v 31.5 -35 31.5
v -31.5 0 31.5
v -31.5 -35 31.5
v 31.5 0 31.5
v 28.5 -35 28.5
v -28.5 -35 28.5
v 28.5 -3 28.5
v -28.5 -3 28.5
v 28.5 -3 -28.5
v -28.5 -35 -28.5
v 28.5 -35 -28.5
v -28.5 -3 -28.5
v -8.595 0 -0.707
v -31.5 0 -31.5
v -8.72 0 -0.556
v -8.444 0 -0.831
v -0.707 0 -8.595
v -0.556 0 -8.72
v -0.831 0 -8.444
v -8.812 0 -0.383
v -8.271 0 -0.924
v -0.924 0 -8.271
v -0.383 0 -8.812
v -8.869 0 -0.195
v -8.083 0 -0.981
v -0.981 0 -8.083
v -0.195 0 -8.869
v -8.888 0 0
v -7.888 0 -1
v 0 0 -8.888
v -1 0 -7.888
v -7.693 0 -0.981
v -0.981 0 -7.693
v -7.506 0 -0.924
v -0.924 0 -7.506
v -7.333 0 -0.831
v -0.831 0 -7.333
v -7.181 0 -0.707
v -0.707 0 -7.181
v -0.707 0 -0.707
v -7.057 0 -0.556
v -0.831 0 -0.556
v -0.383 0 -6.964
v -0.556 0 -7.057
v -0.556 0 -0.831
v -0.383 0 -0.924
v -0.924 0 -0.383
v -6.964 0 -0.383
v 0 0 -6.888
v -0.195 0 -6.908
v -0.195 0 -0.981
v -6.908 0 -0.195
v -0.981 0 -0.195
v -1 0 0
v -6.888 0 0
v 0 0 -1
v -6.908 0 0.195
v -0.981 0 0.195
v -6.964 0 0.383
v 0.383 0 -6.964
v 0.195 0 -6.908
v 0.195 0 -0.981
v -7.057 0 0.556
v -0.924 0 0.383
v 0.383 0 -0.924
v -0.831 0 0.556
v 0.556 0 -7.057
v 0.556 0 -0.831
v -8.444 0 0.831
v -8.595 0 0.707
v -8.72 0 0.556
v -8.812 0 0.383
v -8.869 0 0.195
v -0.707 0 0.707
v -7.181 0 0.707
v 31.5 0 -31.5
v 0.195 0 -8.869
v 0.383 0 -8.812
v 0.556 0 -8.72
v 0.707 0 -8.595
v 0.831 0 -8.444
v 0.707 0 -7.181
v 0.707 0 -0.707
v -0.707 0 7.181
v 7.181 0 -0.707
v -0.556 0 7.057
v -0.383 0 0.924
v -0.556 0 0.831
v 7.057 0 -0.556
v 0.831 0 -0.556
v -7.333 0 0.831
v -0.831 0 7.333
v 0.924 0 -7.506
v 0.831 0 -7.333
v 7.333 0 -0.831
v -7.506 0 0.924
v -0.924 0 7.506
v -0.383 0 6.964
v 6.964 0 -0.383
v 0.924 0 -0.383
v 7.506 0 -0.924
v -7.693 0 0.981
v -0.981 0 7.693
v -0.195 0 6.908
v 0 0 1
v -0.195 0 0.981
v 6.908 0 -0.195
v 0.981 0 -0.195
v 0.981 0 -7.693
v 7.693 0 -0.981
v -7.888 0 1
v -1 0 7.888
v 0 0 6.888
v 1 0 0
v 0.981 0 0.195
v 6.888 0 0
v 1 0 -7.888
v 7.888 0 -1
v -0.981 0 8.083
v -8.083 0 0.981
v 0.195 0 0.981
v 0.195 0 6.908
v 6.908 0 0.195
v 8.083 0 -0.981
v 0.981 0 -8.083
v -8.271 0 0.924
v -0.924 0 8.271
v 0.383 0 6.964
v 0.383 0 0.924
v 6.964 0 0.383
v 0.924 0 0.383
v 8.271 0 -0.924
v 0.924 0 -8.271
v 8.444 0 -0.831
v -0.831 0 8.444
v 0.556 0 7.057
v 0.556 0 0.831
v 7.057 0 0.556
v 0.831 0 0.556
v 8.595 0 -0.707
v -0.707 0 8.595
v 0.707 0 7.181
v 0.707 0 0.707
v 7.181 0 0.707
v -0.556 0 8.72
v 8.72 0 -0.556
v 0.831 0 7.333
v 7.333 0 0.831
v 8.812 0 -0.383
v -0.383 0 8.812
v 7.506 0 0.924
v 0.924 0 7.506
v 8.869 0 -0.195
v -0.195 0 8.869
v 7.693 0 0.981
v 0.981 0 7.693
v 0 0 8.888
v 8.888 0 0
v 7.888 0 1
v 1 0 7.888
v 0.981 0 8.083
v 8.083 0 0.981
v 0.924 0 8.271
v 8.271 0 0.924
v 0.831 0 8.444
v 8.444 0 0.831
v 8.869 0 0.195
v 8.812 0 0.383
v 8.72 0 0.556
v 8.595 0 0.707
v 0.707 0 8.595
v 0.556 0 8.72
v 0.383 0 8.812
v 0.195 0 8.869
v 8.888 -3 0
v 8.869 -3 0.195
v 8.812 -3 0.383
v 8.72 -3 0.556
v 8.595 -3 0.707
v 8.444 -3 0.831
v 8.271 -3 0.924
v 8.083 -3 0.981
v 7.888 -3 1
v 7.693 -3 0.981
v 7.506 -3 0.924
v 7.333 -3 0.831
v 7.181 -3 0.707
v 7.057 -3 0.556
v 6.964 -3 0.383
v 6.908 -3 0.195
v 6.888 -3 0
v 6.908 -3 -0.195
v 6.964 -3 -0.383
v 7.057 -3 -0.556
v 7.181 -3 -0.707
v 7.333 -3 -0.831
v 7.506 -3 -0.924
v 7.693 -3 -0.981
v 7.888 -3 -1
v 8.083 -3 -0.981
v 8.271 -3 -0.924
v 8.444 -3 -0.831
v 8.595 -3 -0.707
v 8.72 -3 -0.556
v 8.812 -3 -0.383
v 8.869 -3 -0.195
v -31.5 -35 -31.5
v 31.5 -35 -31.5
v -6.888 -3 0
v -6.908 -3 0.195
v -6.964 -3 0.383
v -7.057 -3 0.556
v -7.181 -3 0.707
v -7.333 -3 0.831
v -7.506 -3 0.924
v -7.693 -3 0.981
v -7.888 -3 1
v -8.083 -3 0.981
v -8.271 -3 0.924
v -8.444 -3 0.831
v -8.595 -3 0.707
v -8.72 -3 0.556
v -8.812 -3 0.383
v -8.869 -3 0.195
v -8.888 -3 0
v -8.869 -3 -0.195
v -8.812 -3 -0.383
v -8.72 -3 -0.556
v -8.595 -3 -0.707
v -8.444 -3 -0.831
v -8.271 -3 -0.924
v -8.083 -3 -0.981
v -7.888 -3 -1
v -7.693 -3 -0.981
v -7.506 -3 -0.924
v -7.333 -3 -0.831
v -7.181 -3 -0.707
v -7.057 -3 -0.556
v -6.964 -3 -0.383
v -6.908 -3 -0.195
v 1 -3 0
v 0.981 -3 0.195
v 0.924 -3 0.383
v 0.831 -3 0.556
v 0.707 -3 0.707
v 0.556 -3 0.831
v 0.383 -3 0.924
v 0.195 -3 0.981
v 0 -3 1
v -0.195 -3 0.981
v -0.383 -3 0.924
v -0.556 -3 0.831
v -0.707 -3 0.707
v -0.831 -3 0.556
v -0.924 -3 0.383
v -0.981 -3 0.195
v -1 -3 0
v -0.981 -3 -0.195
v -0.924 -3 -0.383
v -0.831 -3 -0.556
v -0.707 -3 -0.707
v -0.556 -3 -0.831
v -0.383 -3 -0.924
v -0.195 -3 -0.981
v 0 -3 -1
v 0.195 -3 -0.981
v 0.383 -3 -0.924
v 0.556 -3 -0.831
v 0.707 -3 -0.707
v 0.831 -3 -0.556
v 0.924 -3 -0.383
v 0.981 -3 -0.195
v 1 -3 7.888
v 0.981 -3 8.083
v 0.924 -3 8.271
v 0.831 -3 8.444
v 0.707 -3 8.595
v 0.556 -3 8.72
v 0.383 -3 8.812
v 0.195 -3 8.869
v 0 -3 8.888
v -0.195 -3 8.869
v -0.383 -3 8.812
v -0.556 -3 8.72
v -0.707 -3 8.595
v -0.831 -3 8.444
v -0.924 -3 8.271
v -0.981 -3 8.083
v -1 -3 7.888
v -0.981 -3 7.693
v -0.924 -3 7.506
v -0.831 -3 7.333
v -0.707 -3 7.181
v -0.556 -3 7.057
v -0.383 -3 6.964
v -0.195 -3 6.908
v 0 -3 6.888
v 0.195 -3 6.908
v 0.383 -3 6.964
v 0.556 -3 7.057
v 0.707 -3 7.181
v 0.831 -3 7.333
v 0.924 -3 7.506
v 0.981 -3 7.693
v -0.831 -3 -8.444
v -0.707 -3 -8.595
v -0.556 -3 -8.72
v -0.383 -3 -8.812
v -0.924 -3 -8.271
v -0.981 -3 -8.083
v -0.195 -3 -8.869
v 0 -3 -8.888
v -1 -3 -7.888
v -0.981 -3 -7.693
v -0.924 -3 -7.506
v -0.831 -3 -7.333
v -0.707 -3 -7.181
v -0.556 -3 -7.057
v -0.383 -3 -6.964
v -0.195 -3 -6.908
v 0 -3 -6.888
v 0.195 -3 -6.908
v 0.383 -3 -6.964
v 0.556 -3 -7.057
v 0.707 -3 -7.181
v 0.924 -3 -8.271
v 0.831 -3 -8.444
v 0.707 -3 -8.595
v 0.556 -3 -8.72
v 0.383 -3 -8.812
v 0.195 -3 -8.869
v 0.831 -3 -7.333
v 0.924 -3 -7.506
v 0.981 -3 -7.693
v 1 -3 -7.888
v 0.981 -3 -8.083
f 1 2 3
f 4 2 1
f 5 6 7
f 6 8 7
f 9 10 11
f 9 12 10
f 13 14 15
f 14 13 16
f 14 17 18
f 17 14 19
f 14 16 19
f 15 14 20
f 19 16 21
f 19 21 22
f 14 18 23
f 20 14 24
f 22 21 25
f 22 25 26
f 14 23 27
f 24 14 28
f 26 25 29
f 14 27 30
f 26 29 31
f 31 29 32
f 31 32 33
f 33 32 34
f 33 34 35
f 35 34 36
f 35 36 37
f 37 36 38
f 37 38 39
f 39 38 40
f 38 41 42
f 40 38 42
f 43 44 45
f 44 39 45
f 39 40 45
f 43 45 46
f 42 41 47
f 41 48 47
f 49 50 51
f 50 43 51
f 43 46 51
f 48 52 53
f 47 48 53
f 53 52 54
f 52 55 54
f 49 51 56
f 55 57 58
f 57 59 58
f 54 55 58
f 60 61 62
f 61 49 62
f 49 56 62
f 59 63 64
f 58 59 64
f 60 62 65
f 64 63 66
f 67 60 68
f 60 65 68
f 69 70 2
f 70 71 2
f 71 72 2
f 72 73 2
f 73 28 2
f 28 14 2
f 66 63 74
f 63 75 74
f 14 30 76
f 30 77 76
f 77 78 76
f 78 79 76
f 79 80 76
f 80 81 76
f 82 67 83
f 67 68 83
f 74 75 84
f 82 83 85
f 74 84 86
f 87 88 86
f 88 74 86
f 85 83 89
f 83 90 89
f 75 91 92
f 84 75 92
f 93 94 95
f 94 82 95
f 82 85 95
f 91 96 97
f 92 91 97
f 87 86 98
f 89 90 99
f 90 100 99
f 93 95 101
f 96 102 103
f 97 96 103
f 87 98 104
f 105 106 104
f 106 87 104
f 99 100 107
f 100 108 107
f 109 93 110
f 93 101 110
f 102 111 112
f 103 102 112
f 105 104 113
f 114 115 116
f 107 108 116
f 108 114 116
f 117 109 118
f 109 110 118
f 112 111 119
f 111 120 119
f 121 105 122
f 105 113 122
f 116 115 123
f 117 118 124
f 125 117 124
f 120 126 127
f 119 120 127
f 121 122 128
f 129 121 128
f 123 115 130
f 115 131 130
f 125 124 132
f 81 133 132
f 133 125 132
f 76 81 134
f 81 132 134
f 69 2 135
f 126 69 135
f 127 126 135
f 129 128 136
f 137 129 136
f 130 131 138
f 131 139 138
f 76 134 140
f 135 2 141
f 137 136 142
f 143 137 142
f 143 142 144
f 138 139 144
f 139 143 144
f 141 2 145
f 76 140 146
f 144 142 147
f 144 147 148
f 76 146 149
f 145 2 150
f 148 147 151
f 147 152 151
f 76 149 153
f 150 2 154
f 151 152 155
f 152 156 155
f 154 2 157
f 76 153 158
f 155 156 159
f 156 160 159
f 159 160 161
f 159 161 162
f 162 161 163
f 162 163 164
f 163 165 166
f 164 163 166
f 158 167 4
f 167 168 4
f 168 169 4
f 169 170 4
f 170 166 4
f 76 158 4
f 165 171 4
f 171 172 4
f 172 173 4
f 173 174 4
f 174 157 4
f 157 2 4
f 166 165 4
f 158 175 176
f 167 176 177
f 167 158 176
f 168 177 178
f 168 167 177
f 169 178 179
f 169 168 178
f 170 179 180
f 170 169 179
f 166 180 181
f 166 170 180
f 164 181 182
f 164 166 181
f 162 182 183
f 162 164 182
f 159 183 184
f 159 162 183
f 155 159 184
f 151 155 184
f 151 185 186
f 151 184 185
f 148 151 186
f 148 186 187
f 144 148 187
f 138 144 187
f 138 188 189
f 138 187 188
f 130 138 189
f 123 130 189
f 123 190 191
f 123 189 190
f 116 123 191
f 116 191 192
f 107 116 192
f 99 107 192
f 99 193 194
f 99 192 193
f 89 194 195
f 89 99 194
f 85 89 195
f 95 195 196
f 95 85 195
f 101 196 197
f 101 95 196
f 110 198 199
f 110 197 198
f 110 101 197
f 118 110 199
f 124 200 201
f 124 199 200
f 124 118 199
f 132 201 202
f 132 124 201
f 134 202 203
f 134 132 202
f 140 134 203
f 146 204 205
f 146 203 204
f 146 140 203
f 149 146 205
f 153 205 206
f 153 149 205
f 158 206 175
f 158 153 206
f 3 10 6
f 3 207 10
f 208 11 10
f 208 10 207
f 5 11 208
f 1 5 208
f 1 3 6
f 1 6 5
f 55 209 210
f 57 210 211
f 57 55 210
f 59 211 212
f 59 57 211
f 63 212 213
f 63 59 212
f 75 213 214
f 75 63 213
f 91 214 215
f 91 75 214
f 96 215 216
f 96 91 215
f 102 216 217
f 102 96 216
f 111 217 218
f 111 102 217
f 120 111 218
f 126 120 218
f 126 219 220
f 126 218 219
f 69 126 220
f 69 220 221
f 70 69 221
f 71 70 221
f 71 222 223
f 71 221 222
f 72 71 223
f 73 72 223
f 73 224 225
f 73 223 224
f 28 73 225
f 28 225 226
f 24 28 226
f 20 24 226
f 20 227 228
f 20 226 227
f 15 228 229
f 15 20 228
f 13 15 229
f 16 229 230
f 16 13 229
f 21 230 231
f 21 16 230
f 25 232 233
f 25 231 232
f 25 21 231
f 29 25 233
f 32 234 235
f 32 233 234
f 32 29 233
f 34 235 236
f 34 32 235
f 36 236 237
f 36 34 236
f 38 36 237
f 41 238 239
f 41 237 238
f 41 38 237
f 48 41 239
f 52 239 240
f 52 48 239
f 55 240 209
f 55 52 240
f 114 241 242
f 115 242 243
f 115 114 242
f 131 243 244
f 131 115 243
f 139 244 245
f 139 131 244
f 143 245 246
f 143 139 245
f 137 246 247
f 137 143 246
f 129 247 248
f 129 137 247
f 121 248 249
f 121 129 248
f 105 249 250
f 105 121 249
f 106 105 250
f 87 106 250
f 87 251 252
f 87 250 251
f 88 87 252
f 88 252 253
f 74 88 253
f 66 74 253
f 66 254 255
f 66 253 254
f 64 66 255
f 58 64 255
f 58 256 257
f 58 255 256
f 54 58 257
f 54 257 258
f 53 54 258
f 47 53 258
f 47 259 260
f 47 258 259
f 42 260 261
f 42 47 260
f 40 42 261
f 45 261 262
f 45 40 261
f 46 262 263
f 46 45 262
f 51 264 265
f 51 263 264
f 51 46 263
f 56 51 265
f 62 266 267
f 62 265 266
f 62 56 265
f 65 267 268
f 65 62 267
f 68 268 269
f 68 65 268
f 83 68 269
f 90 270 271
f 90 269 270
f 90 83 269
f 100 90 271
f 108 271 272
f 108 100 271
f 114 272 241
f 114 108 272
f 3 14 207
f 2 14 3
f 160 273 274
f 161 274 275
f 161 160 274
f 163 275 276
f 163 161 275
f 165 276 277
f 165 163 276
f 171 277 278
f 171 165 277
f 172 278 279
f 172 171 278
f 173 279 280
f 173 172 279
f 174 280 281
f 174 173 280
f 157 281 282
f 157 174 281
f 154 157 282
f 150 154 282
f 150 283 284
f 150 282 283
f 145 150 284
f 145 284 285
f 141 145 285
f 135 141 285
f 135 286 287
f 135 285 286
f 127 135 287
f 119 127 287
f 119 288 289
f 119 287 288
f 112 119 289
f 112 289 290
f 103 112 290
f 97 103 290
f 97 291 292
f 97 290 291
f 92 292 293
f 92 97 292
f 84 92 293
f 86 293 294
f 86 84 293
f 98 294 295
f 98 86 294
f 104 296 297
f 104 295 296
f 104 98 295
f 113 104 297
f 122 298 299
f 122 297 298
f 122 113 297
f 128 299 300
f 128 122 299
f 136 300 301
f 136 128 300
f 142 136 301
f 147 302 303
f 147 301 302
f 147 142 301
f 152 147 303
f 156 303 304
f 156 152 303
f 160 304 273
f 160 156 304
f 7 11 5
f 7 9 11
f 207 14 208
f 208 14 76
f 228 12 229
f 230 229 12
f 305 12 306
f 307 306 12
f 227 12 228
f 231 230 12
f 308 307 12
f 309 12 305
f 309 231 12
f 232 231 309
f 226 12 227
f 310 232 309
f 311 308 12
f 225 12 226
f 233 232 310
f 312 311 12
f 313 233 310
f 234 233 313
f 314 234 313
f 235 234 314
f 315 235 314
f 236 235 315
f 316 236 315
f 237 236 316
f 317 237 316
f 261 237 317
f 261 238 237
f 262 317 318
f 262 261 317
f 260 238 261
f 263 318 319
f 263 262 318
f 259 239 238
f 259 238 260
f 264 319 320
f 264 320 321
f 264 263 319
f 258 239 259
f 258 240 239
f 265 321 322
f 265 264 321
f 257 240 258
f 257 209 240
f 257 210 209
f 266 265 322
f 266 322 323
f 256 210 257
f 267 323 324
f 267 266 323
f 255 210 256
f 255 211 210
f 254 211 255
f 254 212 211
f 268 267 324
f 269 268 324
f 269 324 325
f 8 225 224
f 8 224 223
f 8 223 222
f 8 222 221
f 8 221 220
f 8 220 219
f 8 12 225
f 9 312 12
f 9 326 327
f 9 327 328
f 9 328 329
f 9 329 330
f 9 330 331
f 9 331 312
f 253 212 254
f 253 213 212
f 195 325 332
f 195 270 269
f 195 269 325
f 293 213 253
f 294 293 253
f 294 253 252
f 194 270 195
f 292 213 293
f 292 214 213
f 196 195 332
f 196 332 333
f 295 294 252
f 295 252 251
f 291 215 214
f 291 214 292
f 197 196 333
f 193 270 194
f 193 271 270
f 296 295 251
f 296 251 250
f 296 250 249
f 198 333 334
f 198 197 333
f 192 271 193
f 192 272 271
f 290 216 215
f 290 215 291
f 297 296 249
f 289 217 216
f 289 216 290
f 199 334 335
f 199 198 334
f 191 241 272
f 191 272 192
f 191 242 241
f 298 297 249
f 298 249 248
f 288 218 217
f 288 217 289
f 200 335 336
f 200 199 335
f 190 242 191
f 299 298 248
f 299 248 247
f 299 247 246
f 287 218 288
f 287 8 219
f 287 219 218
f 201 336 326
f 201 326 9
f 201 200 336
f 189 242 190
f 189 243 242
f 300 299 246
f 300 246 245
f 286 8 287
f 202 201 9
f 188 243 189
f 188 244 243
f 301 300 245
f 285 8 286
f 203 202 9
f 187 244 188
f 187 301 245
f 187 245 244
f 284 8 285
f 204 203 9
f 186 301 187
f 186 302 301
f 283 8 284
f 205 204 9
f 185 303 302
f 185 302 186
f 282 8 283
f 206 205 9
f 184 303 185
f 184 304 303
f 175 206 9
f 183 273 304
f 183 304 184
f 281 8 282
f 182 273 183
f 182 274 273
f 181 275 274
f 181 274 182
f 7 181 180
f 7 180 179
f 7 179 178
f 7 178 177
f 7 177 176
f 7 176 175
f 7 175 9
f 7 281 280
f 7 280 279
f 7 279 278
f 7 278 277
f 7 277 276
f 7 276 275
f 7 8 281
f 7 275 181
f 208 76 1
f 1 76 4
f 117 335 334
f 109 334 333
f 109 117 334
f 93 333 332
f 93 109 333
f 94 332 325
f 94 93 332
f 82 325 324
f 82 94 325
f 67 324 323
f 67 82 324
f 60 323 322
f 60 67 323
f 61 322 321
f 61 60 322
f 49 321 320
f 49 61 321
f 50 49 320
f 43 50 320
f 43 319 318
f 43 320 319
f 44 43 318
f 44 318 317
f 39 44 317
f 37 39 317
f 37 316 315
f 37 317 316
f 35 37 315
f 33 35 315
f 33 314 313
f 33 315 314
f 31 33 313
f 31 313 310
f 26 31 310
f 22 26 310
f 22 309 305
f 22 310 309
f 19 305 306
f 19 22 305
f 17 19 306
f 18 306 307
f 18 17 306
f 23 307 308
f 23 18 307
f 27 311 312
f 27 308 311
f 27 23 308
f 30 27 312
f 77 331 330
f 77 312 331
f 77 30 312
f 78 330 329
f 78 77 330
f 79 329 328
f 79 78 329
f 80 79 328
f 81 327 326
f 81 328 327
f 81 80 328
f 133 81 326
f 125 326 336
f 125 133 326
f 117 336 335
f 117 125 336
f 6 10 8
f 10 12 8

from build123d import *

# Parameters (mm, degrees)
F0_W     = 63
F0_H     = 63
F1_DEPTH = 35
F2_T     = -3
F4_R     = 1
F5_DEPTH = 25


with BuildPart() as f1:
    # F0 (on Front) → F1 (new body)
    with BuildSketch(Plane.XZ):
        Rectangle(F0_W, F0_H)
    extrude(amount=F1_DEPTH)

    # F2
    f2_openings = [f1.faces().sort_by_distance(p)[0] for p in [
        (0, -35, 0),
    ]]
    offset(amount=F2_T, openings=f2_openings)

    # F4 (on Front) → F5 (cut)
    with BuildSketch(Plane.XZ):
        with Locations((7.88837, 0)):
            Circle(F4_R)
        with Locations((-7.888372, 0)):
            Circle(F4_R)
        with Locations((0, 7.88837)):
            Circle(F4_R)
        with Locations((0, -7.88837)):
            Circle(F4_R)
        Circle(F4_R)
    extrude(amount=F5_DEPTH, mode=Mode.SUBTRACT)


solid = f1.part
